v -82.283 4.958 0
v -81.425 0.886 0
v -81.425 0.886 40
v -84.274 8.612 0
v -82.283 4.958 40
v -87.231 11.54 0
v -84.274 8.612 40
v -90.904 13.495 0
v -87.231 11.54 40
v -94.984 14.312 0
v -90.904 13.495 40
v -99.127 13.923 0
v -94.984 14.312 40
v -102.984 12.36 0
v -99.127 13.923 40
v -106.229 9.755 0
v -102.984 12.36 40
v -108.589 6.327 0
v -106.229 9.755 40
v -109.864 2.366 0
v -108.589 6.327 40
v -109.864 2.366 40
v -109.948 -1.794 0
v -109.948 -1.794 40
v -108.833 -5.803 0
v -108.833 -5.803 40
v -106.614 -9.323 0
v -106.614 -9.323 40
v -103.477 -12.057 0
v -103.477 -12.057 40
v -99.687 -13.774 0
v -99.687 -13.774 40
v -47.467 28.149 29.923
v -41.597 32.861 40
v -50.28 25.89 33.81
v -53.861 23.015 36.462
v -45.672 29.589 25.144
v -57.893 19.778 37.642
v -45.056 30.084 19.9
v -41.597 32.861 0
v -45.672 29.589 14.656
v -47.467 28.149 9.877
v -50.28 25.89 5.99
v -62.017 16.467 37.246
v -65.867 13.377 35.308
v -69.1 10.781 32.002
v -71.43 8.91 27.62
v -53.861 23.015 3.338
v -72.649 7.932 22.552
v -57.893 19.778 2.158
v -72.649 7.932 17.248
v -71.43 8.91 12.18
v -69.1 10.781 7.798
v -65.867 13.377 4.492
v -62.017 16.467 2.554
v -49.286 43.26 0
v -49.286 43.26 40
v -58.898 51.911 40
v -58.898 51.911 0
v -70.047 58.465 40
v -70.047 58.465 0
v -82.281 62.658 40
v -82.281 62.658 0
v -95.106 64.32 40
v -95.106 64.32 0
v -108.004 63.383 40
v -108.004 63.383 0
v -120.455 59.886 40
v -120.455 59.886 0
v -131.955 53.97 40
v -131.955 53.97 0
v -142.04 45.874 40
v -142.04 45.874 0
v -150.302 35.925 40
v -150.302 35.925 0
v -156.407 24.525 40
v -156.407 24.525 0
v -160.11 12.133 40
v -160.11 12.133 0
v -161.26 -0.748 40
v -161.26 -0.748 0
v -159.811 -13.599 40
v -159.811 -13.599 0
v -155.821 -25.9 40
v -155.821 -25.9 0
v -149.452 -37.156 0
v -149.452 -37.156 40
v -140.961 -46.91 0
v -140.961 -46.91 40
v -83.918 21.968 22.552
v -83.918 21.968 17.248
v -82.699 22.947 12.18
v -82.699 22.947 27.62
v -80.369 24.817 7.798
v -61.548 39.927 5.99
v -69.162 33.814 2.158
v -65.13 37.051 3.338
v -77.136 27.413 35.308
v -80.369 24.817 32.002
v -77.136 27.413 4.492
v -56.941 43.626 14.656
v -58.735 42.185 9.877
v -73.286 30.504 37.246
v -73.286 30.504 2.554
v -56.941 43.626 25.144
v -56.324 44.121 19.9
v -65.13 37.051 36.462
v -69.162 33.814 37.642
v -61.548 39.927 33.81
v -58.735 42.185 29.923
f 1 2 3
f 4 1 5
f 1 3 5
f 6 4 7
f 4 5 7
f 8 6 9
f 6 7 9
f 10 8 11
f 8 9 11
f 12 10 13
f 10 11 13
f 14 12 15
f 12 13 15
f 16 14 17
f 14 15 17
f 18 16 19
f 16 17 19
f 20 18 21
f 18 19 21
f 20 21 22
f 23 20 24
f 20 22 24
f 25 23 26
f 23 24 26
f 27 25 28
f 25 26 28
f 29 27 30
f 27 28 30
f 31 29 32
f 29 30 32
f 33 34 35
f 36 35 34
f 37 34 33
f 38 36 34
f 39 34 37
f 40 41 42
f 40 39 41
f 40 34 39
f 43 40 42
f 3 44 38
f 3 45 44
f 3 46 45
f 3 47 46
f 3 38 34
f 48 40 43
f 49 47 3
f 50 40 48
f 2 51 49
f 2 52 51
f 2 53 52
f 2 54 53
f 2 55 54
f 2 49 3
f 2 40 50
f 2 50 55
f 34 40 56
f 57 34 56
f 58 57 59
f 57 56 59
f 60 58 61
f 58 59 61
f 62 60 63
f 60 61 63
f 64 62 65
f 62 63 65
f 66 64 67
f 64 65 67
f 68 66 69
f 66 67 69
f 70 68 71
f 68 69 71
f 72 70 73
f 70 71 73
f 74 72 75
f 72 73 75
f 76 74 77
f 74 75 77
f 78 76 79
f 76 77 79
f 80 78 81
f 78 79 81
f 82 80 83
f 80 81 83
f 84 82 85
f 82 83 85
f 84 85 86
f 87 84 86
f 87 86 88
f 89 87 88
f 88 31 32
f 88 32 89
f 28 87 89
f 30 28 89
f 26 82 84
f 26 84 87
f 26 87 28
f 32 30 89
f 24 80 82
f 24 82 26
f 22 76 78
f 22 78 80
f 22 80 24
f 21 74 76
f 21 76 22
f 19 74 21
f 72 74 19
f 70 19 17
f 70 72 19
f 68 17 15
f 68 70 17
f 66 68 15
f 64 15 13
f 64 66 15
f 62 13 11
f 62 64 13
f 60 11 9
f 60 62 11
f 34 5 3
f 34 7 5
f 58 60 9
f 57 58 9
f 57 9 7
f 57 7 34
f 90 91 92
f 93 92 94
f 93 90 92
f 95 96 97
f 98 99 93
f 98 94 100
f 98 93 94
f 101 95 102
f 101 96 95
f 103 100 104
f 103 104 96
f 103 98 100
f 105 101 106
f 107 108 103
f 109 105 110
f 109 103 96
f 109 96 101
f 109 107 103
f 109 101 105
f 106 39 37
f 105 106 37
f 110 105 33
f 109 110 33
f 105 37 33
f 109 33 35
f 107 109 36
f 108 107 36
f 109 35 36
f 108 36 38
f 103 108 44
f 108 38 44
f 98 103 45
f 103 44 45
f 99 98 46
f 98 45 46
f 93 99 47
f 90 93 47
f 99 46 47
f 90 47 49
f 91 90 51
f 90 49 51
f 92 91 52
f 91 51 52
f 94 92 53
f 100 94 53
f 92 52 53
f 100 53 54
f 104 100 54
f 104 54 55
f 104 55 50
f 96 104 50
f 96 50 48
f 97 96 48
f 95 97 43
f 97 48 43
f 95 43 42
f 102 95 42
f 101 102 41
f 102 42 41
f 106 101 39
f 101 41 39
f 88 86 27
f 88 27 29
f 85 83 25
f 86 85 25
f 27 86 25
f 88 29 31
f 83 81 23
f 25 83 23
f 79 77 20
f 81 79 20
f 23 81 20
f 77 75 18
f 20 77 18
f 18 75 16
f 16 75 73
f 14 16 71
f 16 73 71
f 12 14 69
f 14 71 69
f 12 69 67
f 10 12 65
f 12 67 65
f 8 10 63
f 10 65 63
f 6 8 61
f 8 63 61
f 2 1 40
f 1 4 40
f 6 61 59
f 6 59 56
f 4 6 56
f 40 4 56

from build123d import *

# Parameters (mm, degrees)
SKETCH1_R               = 64.345413168
BOSS_EXTRUDE1_DEPTH     = 40
SKETCH3_R               = 14.331573803
CUT_EXTRUDE2_DEPTH      = 40
CUT_EXTRUDE3_DEPTH      = 179.175578552
CUT_EXTRUDE3_DEPTH_BACK = 40
SKETCH5_R               = 17.792090532
CUT_EXTRUDE6_DEPTH      = 18


with BuildPart() as part:
    # Sketch1 → Boss-Extrude1 (new body)
    with BuildSketch(Plane.XY):
        with Locations((-96.918980287, 0)):
            Circle(SKETCH1_R)
    extrude(amount=BOSS_EXTRUDE1_DEPTH)

    # Sketch3 → Cut-Extrude2 (cut)
    with BuildSketch(Plane.XY.offset(40)):
        with Locations((-95.729315352, 0)):
            Circle(SKETCH3_R)
    extrude(amount=-CUT_EXTRUDE2_DEPTH, mode=Mode.SUBTRACT)

    # Sketch4 → Cut-Extrude3 (cut, two sides: drawn at the far end of the back side and taken through both)
    with BuildSketch(Plane.XY.offset(40).offset(-CUT_EXTRUDE3_DEPTH_BACK)):
        Polygon((268.087714355, 281.481110593), (-21.116990888, 49.302685257), (-148.180972854, -52.706427026), (-437.385678097, -284.884852362), (26.971172575, -863.294262848), (732.444565027, -296.928299893), align=None)
    extrude(amount=CUT_EXTRUDE3_DEPTH + CUT_EXTRUDE3_DEPTH_BACK, mode=Mode.SUBTRACT)

    # Sketch5 → Cut-Extrude6 (cut)
    with BuildSketch(Plane(origin=(-32.344640606, 40.288938299, 0), x_dir=(0.7797961442184731, 0.626033524231732, 0), z_dir=(0.626033524231732, -0.7797961442184731, 0))):
        with Locations((-34.092669142, 19.900069025)):
            Circle(SKETCH5_R)
    extrude(amount=-CUT_EXTRUDE6_DEPTH, mode=Mode.SUBTRACT)


solid = part.part
